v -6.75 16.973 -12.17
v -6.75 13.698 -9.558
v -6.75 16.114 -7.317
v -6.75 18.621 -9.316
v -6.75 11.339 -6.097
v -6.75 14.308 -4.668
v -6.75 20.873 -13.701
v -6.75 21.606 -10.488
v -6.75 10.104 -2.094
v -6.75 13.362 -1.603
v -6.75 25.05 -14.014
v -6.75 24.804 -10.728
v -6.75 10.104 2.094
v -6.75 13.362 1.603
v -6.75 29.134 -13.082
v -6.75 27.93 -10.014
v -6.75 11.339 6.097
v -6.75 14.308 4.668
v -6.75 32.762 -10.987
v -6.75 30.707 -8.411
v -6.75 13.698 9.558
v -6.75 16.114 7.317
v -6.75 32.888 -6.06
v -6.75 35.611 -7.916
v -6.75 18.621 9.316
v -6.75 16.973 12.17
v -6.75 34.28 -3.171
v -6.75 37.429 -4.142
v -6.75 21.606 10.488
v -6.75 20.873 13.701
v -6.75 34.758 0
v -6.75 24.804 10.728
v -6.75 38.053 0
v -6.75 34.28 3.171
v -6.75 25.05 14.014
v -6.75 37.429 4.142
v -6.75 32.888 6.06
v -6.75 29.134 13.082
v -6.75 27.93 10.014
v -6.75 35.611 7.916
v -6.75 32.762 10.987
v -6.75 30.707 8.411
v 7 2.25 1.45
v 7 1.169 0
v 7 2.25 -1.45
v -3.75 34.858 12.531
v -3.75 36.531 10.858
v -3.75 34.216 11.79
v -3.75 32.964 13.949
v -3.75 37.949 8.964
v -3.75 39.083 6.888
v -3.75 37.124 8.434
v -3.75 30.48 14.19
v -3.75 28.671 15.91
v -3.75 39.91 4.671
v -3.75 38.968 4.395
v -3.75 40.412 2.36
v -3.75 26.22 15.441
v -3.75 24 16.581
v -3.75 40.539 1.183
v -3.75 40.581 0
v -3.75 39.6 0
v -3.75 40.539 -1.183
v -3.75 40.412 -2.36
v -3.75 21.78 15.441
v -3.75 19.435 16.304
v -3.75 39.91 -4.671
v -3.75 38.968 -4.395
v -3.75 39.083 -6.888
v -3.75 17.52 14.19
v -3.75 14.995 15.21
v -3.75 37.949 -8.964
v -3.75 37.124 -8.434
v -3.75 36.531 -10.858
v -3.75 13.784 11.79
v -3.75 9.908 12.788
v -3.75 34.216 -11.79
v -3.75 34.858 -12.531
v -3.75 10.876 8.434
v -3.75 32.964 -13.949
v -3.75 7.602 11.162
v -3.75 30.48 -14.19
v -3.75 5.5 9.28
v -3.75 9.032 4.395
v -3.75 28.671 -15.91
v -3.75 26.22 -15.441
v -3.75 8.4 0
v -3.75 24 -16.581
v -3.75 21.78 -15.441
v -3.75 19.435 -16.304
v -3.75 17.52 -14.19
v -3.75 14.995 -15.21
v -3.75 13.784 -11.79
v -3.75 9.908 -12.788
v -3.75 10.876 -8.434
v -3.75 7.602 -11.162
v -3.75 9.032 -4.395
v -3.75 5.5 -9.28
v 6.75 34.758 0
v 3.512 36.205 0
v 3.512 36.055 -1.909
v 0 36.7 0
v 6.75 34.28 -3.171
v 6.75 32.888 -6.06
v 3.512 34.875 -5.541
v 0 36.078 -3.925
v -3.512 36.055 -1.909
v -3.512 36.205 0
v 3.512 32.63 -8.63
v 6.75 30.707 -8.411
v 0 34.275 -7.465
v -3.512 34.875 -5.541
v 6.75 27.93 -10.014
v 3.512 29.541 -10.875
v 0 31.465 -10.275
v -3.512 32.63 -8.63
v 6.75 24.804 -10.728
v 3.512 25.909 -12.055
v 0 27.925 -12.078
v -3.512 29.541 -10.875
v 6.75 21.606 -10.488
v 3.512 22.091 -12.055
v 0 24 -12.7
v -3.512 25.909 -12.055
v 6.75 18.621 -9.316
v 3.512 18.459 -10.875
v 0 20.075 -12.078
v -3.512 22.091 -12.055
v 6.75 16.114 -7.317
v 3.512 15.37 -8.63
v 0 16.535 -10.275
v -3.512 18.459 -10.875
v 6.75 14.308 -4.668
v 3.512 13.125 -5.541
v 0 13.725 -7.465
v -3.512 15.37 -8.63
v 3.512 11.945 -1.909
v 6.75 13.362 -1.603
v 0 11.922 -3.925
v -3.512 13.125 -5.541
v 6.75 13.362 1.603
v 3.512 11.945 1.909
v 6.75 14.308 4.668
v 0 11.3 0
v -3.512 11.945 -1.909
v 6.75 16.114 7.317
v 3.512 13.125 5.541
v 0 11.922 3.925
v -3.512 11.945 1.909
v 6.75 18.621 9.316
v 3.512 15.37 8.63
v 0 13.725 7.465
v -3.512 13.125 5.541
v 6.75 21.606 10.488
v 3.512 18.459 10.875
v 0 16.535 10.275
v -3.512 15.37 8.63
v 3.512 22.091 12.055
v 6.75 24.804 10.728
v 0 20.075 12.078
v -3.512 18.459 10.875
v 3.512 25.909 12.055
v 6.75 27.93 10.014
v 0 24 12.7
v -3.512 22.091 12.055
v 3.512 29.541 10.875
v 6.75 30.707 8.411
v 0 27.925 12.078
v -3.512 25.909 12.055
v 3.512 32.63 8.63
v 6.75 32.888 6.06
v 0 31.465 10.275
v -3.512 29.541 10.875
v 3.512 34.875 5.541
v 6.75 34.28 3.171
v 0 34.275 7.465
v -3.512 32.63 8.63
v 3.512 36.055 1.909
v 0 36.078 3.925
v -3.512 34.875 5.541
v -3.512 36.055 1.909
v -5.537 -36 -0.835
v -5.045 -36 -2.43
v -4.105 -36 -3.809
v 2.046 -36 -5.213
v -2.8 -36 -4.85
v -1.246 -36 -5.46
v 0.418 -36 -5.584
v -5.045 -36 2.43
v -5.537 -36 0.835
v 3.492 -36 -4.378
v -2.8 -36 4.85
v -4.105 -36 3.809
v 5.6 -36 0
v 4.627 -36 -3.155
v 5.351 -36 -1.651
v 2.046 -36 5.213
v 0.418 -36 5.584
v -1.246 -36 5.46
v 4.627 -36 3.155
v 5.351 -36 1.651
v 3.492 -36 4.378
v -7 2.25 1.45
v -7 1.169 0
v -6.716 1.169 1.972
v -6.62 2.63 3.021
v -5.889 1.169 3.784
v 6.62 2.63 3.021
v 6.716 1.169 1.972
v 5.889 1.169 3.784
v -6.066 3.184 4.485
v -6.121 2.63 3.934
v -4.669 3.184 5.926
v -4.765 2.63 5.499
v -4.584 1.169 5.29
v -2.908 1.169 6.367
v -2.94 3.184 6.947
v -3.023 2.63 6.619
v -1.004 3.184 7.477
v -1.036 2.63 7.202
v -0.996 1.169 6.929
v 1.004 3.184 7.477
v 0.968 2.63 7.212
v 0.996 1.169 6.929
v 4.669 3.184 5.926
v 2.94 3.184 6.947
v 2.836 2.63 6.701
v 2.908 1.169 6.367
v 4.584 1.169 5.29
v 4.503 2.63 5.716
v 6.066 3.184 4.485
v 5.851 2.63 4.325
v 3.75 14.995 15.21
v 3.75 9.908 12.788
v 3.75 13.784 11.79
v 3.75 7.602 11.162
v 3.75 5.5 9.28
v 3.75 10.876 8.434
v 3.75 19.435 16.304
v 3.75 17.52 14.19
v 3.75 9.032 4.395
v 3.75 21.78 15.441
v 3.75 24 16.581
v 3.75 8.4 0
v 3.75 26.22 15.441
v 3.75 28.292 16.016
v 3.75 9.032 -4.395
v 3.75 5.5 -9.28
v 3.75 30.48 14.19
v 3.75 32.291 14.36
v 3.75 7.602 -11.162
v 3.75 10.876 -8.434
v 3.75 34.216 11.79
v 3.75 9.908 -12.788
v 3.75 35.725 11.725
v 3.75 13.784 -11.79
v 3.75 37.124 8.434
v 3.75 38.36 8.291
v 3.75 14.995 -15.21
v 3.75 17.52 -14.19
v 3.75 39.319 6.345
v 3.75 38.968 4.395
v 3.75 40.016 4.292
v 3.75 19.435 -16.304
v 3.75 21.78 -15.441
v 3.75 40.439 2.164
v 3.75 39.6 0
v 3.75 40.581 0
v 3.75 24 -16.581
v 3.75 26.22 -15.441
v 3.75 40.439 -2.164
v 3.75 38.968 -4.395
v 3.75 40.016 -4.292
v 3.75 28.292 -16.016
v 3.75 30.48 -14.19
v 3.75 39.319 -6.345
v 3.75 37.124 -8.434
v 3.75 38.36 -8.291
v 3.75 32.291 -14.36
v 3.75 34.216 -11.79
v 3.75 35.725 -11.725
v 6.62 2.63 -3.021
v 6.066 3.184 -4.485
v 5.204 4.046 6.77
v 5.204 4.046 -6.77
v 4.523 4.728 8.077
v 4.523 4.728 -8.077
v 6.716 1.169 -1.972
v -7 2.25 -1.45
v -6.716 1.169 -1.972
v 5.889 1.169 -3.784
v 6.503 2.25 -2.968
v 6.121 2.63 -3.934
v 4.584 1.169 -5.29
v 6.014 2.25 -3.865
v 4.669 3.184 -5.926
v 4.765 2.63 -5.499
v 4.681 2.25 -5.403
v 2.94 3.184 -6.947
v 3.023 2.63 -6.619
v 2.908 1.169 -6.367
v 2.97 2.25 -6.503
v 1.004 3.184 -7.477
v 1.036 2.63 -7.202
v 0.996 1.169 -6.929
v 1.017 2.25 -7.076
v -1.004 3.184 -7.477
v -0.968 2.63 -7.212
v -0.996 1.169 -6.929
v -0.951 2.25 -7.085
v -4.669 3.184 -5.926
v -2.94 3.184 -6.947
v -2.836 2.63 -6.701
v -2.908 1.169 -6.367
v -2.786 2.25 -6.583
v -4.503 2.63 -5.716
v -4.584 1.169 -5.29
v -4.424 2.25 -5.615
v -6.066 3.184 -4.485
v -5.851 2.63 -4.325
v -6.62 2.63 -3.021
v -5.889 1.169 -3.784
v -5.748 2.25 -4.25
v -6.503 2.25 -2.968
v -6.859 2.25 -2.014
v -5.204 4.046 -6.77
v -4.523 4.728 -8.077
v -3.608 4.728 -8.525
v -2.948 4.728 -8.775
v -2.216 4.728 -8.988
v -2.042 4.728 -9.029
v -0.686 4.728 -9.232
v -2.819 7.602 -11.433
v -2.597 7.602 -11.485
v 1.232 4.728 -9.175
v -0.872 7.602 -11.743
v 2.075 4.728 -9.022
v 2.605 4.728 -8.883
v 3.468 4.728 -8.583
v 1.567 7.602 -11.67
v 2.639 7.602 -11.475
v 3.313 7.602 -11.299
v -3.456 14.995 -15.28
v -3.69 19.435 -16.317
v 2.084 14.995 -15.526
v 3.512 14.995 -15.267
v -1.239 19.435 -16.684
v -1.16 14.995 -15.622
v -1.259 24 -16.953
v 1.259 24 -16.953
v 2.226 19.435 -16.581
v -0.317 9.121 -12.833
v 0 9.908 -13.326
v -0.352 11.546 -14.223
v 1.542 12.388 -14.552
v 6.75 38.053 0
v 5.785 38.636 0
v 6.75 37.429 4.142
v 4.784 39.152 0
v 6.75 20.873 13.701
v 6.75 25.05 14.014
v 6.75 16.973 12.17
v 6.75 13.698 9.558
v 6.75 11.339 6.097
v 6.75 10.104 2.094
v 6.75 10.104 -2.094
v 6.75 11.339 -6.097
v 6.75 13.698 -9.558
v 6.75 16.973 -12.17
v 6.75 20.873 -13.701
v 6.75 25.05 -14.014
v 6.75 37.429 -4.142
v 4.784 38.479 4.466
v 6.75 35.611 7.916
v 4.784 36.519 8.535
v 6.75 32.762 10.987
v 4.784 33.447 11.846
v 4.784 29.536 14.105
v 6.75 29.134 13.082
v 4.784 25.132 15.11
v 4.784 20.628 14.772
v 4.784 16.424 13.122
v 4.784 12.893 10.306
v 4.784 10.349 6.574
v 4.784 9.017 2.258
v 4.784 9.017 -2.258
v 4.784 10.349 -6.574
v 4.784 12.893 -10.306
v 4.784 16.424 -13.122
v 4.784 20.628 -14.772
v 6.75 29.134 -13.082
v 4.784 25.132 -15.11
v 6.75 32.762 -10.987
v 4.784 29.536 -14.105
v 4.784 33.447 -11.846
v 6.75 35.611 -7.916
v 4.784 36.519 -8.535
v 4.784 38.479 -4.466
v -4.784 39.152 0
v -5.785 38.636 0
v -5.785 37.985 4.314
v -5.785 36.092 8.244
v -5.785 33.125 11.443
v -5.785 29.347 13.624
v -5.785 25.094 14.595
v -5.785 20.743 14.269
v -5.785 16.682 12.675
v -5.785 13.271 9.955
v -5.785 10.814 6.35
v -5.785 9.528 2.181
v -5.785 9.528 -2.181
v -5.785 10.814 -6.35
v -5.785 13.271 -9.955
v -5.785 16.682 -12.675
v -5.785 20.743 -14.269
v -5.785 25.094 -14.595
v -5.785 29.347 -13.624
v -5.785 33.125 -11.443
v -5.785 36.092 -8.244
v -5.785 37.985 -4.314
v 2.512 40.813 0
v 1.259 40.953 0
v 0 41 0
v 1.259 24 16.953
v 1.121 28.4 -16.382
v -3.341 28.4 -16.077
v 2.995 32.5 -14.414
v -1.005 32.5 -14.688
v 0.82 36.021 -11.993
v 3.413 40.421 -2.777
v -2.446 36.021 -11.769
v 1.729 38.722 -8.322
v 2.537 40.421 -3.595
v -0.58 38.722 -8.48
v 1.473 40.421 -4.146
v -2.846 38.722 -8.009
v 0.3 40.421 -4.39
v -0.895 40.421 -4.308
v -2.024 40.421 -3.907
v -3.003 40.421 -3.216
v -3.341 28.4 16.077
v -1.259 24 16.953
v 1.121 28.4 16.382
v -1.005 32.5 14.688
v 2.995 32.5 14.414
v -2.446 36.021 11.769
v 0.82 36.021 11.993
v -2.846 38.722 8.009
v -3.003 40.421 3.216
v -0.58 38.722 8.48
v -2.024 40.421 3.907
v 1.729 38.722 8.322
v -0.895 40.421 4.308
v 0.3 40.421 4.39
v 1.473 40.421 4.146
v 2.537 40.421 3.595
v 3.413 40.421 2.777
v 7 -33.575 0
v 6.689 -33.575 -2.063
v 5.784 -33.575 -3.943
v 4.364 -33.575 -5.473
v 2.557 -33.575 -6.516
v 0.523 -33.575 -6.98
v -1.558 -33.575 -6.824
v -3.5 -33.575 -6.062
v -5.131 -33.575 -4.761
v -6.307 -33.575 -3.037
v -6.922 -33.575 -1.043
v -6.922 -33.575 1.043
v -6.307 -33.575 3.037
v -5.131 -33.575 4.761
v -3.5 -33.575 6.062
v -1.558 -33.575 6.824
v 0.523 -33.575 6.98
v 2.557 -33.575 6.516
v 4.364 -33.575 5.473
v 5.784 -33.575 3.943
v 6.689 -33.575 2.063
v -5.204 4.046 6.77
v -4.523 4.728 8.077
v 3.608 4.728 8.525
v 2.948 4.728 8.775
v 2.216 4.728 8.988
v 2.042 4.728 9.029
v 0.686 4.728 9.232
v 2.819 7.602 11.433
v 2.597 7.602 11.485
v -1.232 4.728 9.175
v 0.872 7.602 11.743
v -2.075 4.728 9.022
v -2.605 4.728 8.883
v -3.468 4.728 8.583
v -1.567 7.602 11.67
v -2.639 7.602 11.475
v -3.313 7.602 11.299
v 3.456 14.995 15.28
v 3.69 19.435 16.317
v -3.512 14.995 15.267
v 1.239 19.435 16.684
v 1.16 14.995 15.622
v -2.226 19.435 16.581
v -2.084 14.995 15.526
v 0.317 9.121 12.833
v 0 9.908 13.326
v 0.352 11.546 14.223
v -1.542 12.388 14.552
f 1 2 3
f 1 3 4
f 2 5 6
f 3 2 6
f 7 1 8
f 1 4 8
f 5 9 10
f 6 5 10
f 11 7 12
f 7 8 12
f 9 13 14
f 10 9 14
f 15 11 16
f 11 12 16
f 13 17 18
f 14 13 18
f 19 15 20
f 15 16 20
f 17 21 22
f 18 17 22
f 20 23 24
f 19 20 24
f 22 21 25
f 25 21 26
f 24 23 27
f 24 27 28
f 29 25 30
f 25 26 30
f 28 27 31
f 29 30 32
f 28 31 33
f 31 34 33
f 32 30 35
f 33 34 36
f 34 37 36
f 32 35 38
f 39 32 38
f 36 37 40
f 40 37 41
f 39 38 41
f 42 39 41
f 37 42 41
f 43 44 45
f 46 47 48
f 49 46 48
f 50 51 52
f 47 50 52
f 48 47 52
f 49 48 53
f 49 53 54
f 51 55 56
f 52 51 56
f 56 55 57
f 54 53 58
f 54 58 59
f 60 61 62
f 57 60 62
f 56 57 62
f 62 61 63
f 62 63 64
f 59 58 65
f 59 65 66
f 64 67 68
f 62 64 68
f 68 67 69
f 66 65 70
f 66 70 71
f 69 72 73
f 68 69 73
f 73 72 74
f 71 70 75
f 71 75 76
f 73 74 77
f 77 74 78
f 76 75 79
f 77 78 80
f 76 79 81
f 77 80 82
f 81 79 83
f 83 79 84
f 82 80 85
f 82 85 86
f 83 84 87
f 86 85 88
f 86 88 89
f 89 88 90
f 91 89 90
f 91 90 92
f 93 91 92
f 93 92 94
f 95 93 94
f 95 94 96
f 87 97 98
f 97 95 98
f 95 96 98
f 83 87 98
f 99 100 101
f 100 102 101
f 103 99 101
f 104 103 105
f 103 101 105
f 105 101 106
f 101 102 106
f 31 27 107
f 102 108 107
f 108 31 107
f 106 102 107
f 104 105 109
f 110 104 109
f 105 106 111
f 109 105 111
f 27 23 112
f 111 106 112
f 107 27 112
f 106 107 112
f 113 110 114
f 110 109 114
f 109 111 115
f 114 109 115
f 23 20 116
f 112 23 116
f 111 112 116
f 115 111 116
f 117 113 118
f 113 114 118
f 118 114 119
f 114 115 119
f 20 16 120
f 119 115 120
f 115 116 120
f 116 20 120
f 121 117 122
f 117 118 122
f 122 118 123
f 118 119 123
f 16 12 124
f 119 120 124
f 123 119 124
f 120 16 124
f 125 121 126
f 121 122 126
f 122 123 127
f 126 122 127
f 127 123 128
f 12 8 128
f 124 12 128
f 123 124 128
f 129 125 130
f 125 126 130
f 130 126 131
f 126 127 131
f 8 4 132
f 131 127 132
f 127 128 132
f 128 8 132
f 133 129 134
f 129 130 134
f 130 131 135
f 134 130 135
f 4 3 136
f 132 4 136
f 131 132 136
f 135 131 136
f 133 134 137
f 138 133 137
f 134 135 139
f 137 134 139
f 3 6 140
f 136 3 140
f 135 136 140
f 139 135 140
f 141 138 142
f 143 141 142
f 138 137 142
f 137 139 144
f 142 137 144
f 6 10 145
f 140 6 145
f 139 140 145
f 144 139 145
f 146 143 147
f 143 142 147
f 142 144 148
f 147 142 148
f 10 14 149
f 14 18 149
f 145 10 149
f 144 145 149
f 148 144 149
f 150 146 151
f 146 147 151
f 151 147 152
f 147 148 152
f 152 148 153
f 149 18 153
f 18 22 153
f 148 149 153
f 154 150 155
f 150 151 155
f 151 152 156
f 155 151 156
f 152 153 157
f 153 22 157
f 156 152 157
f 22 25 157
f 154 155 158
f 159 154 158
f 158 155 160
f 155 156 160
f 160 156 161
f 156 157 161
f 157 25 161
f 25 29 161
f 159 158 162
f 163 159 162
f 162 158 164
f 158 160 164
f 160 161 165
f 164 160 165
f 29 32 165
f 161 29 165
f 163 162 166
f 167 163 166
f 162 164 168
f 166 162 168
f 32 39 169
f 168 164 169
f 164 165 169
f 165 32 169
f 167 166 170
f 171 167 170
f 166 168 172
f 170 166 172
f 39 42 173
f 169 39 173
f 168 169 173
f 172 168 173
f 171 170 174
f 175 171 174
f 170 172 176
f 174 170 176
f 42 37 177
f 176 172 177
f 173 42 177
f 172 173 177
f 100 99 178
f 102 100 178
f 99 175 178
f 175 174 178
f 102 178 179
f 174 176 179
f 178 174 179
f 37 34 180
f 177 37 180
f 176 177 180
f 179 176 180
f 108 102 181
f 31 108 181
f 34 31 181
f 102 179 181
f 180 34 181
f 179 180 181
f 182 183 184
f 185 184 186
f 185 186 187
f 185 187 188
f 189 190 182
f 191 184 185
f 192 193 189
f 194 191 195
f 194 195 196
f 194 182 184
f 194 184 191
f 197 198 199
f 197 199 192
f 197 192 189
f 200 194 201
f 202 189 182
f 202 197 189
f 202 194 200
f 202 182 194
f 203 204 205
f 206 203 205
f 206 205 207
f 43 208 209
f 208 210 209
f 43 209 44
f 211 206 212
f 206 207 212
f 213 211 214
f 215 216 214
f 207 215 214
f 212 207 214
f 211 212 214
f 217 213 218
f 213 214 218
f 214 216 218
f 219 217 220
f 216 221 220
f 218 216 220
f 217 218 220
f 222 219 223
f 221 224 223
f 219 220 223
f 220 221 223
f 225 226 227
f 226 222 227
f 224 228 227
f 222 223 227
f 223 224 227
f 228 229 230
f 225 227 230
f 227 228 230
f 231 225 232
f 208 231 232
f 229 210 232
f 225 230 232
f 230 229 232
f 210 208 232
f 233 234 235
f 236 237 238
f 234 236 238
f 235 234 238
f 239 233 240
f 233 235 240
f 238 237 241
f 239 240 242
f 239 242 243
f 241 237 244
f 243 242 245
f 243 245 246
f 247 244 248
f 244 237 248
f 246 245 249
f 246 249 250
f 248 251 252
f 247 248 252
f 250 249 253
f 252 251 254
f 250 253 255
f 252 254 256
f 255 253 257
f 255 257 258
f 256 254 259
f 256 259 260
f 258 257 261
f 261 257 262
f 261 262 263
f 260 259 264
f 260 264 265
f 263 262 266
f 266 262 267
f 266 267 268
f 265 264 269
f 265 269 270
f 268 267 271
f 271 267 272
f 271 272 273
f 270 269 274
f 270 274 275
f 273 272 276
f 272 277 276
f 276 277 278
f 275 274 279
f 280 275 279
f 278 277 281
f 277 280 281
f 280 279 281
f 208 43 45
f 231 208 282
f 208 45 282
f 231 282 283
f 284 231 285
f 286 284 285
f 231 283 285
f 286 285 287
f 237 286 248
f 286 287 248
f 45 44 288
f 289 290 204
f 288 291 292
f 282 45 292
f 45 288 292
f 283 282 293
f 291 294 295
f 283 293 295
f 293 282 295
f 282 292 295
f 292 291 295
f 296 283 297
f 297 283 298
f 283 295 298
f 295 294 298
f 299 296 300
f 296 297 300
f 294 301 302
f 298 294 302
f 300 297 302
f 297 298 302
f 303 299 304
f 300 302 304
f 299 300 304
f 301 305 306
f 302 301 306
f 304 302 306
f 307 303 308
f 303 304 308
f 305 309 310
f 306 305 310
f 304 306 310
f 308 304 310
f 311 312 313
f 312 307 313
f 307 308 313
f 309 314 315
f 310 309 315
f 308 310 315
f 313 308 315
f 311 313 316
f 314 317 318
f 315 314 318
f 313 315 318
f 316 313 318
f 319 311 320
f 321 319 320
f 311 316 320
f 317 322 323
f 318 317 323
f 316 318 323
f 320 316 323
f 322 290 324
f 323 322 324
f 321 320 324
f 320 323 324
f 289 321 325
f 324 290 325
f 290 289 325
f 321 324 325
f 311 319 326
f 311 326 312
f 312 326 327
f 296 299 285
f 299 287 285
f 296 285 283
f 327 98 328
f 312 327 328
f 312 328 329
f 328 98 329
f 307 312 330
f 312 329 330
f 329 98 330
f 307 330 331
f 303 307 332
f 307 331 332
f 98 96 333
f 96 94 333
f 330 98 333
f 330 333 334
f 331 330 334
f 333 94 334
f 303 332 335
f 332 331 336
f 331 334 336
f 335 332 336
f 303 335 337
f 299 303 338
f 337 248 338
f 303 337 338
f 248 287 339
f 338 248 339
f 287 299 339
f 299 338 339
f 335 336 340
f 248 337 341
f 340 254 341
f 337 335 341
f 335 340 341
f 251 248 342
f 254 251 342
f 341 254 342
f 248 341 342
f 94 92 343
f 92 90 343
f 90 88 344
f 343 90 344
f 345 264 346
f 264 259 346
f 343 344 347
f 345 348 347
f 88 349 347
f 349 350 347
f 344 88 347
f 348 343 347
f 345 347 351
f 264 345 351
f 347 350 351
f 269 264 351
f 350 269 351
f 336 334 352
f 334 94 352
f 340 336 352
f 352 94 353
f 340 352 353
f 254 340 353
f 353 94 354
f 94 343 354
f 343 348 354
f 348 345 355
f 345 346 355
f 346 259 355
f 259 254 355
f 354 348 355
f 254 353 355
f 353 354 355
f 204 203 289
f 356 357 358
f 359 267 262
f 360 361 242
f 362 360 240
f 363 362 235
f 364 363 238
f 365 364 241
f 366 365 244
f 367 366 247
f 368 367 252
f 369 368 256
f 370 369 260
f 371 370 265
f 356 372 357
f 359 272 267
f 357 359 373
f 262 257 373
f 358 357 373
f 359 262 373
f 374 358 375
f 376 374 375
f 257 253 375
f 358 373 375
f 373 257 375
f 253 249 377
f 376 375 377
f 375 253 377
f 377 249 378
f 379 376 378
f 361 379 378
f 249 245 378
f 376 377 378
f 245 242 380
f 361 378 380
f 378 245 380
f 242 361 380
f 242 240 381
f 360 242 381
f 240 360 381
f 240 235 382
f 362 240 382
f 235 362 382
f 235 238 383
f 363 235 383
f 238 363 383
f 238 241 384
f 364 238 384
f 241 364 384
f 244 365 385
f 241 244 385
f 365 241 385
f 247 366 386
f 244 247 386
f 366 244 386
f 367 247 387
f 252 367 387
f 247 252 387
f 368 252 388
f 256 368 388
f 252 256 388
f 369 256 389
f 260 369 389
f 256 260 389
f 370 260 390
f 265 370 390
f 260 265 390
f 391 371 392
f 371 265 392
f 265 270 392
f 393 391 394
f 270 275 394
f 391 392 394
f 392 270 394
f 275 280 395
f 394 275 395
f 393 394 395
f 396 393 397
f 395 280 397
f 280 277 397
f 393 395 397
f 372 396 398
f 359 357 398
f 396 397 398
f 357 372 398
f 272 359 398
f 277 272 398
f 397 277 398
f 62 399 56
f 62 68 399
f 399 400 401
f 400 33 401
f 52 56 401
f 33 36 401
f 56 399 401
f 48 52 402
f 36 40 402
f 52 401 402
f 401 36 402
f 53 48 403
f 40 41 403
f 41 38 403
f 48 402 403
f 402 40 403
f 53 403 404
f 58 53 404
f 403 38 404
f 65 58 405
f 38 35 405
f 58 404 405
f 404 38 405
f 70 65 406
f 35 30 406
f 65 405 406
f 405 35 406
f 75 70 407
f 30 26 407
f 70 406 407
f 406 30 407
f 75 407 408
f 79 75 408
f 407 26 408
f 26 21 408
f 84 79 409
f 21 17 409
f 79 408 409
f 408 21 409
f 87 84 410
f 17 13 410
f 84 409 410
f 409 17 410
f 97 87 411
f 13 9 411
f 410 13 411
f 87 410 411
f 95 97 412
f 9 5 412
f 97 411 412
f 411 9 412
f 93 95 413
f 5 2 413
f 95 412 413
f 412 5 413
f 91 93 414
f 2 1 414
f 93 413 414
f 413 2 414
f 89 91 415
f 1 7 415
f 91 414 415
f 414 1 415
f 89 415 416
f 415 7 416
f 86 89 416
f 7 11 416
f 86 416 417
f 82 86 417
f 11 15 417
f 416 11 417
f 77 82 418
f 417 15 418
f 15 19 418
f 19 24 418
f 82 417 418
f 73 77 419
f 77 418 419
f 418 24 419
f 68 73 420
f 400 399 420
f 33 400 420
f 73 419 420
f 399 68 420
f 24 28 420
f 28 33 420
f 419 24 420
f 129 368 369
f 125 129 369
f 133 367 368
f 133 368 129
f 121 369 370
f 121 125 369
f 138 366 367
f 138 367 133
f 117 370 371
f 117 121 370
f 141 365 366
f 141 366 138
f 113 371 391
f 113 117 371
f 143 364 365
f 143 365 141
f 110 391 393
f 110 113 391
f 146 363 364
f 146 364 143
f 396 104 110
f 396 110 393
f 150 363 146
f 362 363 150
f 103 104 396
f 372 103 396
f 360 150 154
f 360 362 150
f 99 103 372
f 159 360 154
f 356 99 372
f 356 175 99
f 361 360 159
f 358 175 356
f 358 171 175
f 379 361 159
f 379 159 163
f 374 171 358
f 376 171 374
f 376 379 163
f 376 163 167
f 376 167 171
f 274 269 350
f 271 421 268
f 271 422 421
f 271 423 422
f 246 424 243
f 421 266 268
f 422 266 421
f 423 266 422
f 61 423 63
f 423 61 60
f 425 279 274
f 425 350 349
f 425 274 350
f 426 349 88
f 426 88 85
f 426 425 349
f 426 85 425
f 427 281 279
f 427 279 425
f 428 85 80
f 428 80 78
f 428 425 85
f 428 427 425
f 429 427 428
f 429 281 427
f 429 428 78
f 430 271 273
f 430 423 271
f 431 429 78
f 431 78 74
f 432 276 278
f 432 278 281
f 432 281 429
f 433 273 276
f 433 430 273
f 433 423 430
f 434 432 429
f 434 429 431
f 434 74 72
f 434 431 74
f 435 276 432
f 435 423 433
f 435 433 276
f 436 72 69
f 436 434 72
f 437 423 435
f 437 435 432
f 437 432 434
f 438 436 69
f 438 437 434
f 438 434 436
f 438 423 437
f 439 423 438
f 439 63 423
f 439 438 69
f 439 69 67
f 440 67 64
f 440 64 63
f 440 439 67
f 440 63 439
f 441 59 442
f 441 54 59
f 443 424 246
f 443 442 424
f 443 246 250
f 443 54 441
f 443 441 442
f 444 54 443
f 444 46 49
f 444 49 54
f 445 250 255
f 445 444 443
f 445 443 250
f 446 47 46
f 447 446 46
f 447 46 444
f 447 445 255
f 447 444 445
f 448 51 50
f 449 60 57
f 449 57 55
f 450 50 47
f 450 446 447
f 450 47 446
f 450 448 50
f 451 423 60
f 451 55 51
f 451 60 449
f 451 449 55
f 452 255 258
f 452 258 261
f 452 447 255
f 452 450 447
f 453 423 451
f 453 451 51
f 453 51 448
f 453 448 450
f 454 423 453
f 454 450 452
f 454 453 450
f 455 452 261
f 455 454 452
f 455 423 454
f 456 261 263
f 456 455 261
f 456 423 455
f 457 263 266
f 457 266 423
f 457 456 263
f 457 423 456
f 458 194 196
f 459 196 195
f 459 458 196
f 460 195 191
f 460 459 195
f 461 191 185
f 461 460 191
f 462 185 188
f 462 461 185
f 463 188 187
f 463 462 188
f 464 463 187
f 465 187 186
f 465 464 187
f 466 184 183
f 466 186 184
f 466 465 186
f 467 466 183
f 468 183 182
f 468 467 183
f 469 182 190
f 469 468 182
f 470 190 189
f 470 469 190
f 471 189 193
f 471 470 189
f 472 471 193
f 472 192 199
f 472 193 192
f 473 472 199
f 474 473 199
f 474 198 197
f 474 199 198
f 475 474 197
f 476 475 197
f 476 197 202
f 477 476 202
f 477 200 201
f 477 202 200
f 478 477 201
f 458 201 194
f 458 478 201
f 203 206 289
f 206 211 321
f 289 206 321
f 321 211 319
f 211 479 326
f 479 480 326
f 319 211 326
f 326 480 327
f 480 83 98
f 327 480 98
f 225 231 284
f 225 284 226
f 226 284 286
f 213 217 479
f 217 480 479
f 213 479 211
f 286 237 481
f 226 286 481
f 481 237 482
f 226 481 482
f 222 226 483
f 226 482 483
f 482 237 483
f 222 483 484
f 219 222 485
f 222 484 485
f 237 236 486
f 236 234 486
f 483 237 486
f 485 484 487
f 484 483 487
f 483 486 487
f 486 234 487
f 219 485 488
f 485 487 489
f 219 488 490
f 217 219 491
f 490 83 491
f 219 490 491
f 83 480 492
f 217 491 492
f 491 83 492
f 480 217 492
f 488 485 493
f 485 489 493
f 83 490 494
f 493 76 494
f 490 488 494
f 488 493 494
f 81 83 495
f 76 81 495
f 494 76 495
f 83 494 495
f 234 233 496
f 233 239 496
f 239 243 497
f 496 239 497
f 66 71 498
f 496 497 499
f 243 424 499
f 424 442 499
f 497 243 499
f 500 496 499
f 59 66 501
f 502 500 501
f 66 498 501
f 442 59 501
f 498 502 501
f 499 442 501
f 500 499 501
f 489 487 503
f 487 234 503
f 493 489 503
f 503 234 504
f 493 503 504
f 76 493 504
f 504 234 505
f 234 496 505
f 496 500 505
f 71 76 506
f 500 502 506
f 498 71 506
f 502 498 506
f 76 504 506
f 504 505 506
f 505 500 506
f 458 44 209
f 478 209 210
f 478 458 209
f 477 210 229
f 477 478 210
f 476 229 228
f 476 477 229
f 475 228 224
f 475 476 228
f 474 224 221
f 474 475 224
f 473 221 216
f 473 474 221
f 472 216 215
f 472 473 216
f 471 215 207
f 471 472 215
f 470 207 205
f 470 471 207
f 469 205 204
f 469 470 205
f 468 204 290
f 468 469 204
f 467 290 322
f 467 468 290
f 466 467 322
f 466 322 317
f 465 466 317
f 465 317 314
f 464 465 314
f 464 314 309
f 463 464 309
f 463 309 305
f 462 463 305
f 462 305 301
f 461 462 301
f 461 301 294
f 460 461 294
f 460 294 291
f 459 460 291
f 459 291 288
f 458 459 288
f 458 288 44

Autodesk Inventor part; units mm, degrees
sketch "Sketch_4" plane through (0, 0, 0) normal (0, 0, 1) x (1, 0, 0)
  line L0 (0, -36) -> (0, 41)
  arc A0 (17, 24) -> (0, 41) centre (0, 24) ccw
  arc A1 (7.5441, 3.1836) -> (17, 24) centre (-8.9892, 23.2497) ccw
  arc A2 (7.5441, 3.1836) -> (7, 1.1694) centre (11, 1.1694) ccw
  line L1 (7, 1.1694) -> (7, -33.5751)
  line L2 (7, -33.5751) -> (5.6, -36)
  line L3 (5.6, -36) -> (0, -36)
  line L4 (0, -36) -> (0, 41)
revolve "Revolution1" add sketch "Sketch_4" angle 360 about axis through (0, -36, 0) along (0, -1, 0)
thread "Thread1" size "M14x2" class "6g" standard "ISO Metric profile" full length
sketch "Sketch_5" plane through (0, 0, 0) normal (0, 0, 1) x (1, 0, 0)
  line L0 (-25.5, 42.8) -> (-25.5, -39.6)
  line L1 (-25.5, -39.6) -> (25.5, -39.6)
  line L2 (25.5, -39.6) -> (25.5, 42.8)
  line L3 (25.5, 42.8) -> (-25.5, 42.8)
  line L4 (-7, 2.25) -> (-7, -36)
  line L5 (-7, -36) -> (7, -36)
  line L6 (7, -36) -> (7, 2.25)
  line L7 (7, 2.25) -> (3.7501, 5.5)
  line L8 (3.7501, 5.5) -> (3.7501, 41)
  line L9 (3.7501, 41) -> (-3.7501, 41)
  line L10 (-3.7501, 41) -> (-3.7501, 5.5)
  line L11 (-3.7501, 5.5) -> (-7, 2.25)
extrude "Extrusion1" cut sketch "Sketch_5" along normal mid plane 34
sketch "Sketch_6" plane through (0, 0, 0) normal (0, 0, 1) x (1, 0, 0)
  line L0 (6.75, 24) -> (-6.75, 24)
  line L1 (-6.75, 24) -> (-6.75, 38.053)
  arc A0 (-3.7501, 39.6) -> (-6.75, 38.053) centre (2.3958, 24.0001) ccw
  line L2 (-3.7501, 39.6) -> (3.7501, 39.6)
  arc A1 (6.75, 38.053) -> (3.7501, 39.6) centre (-2.3958, 24.0001) ccw
  line L3 (6.75, 38.053) -> (6.75, 24)
  line L4 (6.75, 24) -> (-6.75, 24)
revolve "Revolution2" add sketch "Sketch_6" angle 360 about axis through (6.75, 24, 0) along (1, 0, 0)
sketch "Sketch_7" plane through (0, 0, 0) normal (0, 0, 1) x (1, 0, 0)
  line L0 (12.7, 24) -> (-12.7, 24)
  arc A0 (12.7, 24) -> (-12.7, 24) centre (0, 24) ccw
  line L1 (12.7, 24) -> (-12.7, 24)
revolve "Revolution3" cut sketch "Sketch_7" angle 360 about axis through (12.7, 24, 0) along (1, 0, 0)
ref_plane "IP_1_BO_XY" through (0, 24, 0) normal (1, 0, 0) x (0, 0, -1)
ref_plane "IP_1_BO_YZ" through (0, 24, 0) normal (0, 0, -1) x (0, 1, 0)
ref_plane "IP_1_BO_ZX" through (0, 24, 0) normal (0, 1, 0) x (1, 0, 0)
properties part number "POS 14ECBody"
